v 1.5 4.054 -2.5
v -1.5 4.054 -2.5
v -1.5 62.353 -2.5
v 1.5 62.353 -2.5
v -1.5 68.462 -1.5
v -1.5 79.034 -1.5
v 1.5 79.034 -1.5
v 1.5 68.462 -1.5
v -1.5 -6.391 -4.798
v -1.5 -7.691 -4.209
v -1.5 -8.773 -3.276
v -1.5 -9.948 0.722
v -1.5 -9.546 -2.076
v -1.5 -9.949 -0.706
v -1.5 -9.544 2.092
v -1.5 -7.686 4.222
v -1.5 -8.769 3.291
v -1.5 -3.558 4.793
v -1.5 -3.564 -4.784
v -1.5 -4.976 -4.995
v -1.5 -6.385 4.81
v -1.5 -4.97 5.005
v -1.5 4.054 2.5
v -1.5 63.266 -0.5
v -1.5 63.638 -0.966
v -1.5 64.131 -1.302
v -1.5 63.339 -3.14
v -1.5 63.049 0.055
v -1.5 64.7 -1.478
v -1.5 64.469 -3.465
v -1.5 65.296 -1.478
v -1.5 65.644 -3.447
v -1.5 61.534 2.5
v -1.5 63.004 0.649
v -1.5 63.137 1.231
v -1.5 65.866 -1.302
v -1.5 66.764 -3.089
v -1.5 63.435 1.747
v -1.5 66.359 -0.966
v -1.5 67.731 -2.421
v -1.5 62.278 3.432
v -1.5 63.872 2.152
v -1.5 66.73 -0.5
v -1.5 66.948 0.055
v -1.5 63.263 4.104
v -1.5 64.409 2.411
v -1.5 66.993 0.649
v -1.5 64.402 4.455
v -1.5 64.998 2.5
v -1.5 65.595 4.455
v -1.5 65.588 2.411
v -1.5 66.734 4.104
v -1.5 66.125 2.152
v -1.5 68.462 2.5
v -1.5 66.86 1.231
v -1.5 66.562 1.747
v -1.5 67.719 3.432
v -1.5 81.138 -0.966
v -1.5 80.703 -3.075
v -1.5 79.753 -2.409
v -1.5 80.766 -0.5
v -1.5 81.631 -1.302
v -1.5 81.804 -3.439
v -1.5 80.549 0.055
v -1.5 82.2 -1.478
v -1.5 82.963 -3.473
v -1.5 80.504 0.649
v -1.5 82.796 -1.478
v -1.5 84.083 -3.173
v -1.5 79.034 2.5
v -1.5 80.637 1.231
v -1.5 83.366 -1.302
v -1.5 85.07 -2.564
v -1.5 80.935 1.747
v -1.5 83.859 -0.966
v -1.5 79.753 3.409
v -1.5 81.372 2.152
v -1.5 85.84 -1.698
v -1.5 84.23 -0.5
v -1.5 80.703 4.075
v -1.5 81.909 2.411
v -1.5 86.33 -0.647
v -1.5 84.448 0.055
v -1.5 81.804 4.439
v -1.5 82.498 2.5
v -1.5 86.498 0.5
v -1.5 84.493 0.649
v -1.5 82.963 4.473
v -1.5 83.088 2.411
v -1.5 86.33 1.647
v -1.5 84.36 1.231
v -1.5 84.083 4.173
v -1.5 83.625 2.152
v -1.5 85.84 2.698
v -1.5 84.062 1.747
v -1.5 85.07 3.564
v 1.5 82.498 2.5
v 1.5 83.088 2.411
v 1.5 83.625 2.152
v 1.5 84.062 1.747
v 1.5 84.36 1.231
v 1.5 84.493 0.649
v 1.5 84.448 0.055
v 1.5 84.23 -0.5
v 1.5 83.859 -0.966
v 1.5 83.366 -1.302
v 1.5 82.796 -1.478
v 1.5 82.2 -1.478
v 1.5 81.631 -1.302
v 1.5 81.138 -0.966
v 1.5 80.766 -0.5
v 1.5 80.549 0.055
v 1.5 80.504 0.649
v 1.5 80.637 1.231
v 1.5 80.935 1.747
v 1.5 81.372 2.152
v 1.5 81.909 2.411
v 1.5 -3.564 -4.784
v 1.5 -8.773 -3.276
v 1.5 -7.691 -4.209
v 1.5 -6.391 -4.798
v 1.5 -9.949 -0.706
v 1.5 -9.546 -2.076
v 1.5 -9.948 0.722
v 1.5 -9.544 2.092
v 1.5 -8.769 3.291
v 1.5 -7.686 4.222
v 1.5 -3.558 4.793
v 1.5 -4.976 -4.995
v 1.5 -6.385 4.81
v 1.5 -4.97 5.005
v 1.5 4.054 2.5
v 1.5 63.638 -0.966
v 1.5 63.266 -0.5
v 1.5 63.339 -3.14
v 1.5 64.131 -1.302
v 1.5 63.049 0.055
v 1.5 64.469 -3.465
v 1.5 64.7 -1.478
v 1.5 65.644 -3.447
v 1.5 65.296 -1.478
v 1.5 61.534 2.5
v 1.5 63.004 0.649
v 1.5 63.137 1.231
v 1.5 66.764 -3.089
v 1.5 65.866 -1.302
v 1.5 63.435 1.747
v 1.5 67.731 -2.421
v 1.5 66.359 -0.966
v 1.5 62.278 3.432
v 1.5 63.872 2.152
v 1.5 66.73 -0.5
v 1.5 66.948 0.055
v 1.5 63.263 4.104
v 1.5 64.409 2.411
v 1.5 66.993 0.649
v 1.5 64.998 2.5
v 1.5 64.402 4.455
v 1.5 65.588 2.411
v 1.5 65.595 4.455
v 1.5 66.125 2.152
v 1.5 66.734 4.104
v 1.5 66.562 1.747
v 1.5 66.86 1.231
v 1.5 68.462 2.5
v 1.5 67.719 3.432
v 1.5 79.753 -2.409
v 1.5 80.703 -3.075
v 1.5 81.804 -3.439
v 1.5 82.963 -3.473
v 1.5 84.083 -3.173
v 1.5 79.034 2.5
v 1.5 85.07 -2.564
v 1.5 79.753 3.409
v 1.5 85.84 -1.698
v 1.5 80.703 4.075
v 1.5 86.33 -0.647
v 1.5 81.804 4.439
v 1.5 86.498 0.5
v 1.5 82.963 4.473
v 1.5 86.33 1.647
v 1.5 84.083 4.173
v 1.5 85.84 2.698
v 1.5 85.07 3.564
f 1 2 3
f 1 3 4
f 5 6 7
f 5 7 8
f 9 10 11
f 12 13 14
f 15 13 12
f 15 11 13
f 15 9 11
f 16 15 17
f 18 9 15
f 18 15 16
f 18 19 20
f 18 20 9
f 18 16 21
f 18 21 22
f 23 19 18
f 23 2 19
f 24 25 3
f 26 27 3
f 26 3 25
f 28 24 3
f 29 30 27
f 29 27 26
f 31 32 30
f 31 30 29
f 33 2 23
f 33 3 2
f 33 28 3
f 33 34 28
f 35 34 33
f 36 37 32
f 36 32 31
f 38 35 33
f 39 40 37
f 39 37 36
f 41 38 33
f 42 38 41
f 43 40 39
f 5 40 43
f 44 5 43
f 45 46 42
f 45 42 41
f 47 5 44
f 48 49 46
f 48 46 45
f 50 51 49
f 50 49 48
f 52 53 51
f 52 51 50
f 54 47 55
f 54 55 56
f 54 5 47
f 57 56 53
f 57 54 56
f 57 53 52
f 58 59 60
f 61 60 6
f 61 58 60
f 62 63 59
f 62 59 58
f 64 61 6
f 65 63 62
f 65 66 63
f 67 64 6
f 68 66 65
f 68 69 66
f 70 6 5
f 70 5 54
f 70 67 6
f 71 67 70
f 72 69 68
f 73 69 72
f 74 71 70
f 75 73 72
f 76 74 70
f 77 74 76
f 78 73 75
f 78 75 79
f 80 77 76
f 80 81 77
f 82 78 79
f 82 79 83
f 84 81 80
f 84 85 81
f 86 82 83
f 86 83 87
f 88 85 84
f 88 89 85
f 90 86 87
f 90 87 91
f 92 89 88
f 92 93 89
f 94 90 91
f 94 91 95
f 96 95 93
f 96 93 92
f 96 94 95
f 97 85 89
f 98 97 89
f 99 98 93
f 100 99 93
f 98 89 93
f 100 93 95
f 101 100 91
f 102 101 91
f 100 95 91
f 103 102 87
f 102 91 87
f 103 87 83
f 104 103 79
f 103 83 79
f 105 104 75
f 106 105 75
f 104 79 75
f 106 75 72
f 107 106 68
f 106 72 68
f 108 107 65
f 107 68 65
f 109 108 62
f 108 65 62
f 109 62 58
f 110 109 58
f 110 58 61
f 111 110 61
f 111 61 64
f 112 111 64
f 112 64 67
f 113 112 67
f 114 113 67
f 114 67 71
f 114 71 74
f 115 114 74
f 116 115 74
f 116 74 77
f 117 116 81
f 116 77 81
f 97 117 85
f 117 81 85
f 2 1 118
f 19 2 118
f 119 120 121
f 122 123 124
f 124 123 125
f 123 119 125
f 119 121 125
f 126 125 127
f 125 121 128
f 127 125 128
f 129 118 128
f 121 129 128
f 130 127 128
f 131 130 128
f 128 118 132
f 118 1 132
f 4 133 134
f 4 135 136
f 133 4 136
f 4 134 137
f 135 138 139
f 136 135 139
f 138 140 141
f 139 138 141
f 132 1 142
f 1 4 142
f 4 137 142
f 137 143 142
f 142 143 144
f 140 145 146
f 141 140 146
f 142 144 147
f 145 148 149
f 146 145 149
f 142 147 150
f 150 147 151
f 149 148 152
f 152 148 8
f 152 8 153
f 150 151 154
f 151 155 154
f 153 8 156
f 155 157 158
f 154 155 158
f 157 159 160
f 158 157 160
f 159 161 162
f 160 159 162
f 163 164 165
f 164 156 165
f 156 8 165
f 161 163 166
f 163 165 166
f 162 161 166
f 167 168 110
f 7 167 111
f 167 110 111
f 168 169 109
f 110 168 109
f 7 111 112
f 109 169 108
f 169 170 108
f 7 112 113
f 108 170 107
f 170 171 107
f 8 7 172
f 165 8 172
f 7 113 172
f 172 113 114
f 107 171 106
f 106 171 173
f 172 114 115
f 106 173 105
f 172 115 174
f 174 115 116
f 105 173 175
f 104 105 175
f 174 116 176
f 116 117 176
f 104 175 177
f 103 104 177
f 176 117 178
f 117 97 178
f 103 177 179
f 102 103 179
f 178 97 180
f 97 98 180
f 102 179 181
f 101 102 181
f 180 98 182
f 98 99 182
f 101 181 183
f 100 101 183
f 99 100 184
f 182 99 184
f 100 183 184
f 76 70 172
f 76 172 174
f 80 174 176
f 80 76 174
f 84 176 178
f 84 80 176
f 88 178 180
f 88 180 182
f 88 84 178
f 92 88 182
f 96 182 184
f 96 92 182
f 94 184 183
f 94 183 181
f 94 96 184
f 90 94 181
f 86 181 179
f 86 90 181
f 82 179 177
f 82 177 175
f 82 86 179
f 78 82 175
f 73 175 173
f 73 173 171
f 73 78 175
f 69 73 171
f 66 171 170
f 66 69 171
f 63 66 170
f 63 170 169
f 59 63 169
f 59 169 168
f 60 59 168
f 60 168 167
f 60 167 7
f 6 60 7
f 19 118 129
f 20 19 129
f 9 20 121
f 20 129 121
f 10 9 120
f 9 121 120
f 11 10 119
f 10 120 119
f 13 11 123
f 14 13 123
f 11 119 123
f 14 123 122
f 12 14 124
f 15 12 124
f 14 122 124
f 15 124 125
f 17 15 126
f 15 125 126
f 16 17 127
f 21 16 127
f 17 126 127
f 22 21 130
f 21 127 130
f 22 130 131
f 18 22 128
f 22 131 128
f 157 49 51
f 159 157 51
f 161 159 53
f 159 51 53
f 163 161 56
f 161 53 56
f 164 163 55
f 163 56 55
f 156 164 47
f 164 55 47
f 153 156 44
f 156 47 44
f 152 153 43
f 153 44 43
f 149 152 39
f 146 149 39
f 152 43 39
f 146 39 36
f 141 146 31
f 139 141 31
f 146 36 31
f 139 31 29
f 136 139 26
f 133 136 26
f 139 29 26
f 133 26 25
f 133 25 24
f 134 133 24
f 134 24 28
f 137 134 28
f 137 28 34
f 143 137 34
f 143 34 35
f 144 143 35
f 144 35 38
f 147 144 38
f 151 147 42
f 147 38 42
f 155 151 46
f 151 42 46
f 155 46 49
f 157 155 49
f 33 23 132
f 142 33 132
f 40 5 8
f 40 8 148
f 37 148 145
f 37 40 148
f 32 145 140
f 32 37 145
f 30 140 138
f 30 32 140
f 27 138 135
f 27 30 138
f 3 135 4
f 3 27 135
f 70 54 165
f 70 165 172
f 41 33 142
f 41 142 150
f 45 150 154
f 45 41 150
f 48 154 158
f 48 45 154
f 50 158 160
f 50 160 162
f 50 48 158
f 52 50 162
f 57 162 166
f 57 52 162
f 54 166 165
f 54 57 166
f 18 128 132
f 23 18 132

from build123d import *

# Parameters (mm, degrees)
ESQUISSE1_W         = 3
ESQUISSE1_H         = 5
BOSS_EXTRU_1_DEPTH  = 65
BOSS_EXTRUDE1_START = -3
BOSS_EXTRUDE1_DEPTH = 3
ESQUISSE3_R         = 2
BOSS_EXTRUDE3_DEPTH = 3
ESQUISSE3_10_R      = 2
CUT_EXTRUDE2_DEPTH  = 10


# Read off the part's stored shape, not the designer's step: Boss-Extrude1
with BuildPart() as part:
    # Esquisse1 → Boss.-Extru.1 (new body)
    with BuildSketch(Plane(origin=(0, 0, 0), x_dir=(1, 0, 0), z_dir=(0, 1, 0))):
        Rectangle(ESQUISSE1_W, ESQUISSE1_H)
    extrude(amount=BOSS_EXTRU_1_DEPTH)

    # Boss-Extrude1 outline → Boss-Extrude1 (add)
    with BuildSketch(Plane.ZY.offset(1.5).offset(BOSS_EXTRUDE1_START)):
        with BuildLine():
            Line((4.792700519, -3.558056958), (2.5, 4.054226947))
            Line((2.5, 4.054226947), (2.5, 0))
            Line((2.5, 0), (-2.5, 0))
            Line((-2.5, 0), (-2.5, 4.054226947))
            Line((-2.5, 4.054226947), (-4.784214598, -3.563976926))
            ThreePointArc((-4.784214598, -3.563976926), (0.008223214, -9.999996411), (4.792700519, -3.558056958))
        make_face()
    extrude(amount=BOSS_EXTRUDE1_DEPTH)

    # Esquisse3 → Boss-Extrude3 (add, through all)
    with BuildSketch(Plane.ZY.offset(1.5)):
        with BuildLine():
            ThreePointArc((2.5, 79.034286522), (0.5, 86.498388137), (-1.5, 79.034286522))
            Line((-1.5, 79.034286522), (-1.5, 68.462489753))
            ThreePointArc((-1.5, 68.462489753), (0.5, 60.998388137), (2.5, 68.462489753))
            Line((2.5, 68.462489753), (2.5, 79.034286522))
        make_face()
        with Locations((0.5, 82.498388137)):
            Circle(ESQUISSE3_R, mode=Mode.SUBTRACT)
        with Locations((0.5, 64.998388137)):
            Circle(ESQUISSE3_R, mode=Mode.SUBTRACT)
    extrude(amount=-BOSS_EXTRUDE3_DEPTH)

    # Esquisse3<10> → Cut-Extrude2 (cut)
    with BuildSketch(Plane.ZY.offset(1.5)):
        with Locations((0.5, 64.998388137)):
            Circle(ESQUISSE3_10_R)
    extrude(amount=-CUT_EXTRUDE2_DEPTH, mode=Mode.SUBTRACT)


solid = part.part
